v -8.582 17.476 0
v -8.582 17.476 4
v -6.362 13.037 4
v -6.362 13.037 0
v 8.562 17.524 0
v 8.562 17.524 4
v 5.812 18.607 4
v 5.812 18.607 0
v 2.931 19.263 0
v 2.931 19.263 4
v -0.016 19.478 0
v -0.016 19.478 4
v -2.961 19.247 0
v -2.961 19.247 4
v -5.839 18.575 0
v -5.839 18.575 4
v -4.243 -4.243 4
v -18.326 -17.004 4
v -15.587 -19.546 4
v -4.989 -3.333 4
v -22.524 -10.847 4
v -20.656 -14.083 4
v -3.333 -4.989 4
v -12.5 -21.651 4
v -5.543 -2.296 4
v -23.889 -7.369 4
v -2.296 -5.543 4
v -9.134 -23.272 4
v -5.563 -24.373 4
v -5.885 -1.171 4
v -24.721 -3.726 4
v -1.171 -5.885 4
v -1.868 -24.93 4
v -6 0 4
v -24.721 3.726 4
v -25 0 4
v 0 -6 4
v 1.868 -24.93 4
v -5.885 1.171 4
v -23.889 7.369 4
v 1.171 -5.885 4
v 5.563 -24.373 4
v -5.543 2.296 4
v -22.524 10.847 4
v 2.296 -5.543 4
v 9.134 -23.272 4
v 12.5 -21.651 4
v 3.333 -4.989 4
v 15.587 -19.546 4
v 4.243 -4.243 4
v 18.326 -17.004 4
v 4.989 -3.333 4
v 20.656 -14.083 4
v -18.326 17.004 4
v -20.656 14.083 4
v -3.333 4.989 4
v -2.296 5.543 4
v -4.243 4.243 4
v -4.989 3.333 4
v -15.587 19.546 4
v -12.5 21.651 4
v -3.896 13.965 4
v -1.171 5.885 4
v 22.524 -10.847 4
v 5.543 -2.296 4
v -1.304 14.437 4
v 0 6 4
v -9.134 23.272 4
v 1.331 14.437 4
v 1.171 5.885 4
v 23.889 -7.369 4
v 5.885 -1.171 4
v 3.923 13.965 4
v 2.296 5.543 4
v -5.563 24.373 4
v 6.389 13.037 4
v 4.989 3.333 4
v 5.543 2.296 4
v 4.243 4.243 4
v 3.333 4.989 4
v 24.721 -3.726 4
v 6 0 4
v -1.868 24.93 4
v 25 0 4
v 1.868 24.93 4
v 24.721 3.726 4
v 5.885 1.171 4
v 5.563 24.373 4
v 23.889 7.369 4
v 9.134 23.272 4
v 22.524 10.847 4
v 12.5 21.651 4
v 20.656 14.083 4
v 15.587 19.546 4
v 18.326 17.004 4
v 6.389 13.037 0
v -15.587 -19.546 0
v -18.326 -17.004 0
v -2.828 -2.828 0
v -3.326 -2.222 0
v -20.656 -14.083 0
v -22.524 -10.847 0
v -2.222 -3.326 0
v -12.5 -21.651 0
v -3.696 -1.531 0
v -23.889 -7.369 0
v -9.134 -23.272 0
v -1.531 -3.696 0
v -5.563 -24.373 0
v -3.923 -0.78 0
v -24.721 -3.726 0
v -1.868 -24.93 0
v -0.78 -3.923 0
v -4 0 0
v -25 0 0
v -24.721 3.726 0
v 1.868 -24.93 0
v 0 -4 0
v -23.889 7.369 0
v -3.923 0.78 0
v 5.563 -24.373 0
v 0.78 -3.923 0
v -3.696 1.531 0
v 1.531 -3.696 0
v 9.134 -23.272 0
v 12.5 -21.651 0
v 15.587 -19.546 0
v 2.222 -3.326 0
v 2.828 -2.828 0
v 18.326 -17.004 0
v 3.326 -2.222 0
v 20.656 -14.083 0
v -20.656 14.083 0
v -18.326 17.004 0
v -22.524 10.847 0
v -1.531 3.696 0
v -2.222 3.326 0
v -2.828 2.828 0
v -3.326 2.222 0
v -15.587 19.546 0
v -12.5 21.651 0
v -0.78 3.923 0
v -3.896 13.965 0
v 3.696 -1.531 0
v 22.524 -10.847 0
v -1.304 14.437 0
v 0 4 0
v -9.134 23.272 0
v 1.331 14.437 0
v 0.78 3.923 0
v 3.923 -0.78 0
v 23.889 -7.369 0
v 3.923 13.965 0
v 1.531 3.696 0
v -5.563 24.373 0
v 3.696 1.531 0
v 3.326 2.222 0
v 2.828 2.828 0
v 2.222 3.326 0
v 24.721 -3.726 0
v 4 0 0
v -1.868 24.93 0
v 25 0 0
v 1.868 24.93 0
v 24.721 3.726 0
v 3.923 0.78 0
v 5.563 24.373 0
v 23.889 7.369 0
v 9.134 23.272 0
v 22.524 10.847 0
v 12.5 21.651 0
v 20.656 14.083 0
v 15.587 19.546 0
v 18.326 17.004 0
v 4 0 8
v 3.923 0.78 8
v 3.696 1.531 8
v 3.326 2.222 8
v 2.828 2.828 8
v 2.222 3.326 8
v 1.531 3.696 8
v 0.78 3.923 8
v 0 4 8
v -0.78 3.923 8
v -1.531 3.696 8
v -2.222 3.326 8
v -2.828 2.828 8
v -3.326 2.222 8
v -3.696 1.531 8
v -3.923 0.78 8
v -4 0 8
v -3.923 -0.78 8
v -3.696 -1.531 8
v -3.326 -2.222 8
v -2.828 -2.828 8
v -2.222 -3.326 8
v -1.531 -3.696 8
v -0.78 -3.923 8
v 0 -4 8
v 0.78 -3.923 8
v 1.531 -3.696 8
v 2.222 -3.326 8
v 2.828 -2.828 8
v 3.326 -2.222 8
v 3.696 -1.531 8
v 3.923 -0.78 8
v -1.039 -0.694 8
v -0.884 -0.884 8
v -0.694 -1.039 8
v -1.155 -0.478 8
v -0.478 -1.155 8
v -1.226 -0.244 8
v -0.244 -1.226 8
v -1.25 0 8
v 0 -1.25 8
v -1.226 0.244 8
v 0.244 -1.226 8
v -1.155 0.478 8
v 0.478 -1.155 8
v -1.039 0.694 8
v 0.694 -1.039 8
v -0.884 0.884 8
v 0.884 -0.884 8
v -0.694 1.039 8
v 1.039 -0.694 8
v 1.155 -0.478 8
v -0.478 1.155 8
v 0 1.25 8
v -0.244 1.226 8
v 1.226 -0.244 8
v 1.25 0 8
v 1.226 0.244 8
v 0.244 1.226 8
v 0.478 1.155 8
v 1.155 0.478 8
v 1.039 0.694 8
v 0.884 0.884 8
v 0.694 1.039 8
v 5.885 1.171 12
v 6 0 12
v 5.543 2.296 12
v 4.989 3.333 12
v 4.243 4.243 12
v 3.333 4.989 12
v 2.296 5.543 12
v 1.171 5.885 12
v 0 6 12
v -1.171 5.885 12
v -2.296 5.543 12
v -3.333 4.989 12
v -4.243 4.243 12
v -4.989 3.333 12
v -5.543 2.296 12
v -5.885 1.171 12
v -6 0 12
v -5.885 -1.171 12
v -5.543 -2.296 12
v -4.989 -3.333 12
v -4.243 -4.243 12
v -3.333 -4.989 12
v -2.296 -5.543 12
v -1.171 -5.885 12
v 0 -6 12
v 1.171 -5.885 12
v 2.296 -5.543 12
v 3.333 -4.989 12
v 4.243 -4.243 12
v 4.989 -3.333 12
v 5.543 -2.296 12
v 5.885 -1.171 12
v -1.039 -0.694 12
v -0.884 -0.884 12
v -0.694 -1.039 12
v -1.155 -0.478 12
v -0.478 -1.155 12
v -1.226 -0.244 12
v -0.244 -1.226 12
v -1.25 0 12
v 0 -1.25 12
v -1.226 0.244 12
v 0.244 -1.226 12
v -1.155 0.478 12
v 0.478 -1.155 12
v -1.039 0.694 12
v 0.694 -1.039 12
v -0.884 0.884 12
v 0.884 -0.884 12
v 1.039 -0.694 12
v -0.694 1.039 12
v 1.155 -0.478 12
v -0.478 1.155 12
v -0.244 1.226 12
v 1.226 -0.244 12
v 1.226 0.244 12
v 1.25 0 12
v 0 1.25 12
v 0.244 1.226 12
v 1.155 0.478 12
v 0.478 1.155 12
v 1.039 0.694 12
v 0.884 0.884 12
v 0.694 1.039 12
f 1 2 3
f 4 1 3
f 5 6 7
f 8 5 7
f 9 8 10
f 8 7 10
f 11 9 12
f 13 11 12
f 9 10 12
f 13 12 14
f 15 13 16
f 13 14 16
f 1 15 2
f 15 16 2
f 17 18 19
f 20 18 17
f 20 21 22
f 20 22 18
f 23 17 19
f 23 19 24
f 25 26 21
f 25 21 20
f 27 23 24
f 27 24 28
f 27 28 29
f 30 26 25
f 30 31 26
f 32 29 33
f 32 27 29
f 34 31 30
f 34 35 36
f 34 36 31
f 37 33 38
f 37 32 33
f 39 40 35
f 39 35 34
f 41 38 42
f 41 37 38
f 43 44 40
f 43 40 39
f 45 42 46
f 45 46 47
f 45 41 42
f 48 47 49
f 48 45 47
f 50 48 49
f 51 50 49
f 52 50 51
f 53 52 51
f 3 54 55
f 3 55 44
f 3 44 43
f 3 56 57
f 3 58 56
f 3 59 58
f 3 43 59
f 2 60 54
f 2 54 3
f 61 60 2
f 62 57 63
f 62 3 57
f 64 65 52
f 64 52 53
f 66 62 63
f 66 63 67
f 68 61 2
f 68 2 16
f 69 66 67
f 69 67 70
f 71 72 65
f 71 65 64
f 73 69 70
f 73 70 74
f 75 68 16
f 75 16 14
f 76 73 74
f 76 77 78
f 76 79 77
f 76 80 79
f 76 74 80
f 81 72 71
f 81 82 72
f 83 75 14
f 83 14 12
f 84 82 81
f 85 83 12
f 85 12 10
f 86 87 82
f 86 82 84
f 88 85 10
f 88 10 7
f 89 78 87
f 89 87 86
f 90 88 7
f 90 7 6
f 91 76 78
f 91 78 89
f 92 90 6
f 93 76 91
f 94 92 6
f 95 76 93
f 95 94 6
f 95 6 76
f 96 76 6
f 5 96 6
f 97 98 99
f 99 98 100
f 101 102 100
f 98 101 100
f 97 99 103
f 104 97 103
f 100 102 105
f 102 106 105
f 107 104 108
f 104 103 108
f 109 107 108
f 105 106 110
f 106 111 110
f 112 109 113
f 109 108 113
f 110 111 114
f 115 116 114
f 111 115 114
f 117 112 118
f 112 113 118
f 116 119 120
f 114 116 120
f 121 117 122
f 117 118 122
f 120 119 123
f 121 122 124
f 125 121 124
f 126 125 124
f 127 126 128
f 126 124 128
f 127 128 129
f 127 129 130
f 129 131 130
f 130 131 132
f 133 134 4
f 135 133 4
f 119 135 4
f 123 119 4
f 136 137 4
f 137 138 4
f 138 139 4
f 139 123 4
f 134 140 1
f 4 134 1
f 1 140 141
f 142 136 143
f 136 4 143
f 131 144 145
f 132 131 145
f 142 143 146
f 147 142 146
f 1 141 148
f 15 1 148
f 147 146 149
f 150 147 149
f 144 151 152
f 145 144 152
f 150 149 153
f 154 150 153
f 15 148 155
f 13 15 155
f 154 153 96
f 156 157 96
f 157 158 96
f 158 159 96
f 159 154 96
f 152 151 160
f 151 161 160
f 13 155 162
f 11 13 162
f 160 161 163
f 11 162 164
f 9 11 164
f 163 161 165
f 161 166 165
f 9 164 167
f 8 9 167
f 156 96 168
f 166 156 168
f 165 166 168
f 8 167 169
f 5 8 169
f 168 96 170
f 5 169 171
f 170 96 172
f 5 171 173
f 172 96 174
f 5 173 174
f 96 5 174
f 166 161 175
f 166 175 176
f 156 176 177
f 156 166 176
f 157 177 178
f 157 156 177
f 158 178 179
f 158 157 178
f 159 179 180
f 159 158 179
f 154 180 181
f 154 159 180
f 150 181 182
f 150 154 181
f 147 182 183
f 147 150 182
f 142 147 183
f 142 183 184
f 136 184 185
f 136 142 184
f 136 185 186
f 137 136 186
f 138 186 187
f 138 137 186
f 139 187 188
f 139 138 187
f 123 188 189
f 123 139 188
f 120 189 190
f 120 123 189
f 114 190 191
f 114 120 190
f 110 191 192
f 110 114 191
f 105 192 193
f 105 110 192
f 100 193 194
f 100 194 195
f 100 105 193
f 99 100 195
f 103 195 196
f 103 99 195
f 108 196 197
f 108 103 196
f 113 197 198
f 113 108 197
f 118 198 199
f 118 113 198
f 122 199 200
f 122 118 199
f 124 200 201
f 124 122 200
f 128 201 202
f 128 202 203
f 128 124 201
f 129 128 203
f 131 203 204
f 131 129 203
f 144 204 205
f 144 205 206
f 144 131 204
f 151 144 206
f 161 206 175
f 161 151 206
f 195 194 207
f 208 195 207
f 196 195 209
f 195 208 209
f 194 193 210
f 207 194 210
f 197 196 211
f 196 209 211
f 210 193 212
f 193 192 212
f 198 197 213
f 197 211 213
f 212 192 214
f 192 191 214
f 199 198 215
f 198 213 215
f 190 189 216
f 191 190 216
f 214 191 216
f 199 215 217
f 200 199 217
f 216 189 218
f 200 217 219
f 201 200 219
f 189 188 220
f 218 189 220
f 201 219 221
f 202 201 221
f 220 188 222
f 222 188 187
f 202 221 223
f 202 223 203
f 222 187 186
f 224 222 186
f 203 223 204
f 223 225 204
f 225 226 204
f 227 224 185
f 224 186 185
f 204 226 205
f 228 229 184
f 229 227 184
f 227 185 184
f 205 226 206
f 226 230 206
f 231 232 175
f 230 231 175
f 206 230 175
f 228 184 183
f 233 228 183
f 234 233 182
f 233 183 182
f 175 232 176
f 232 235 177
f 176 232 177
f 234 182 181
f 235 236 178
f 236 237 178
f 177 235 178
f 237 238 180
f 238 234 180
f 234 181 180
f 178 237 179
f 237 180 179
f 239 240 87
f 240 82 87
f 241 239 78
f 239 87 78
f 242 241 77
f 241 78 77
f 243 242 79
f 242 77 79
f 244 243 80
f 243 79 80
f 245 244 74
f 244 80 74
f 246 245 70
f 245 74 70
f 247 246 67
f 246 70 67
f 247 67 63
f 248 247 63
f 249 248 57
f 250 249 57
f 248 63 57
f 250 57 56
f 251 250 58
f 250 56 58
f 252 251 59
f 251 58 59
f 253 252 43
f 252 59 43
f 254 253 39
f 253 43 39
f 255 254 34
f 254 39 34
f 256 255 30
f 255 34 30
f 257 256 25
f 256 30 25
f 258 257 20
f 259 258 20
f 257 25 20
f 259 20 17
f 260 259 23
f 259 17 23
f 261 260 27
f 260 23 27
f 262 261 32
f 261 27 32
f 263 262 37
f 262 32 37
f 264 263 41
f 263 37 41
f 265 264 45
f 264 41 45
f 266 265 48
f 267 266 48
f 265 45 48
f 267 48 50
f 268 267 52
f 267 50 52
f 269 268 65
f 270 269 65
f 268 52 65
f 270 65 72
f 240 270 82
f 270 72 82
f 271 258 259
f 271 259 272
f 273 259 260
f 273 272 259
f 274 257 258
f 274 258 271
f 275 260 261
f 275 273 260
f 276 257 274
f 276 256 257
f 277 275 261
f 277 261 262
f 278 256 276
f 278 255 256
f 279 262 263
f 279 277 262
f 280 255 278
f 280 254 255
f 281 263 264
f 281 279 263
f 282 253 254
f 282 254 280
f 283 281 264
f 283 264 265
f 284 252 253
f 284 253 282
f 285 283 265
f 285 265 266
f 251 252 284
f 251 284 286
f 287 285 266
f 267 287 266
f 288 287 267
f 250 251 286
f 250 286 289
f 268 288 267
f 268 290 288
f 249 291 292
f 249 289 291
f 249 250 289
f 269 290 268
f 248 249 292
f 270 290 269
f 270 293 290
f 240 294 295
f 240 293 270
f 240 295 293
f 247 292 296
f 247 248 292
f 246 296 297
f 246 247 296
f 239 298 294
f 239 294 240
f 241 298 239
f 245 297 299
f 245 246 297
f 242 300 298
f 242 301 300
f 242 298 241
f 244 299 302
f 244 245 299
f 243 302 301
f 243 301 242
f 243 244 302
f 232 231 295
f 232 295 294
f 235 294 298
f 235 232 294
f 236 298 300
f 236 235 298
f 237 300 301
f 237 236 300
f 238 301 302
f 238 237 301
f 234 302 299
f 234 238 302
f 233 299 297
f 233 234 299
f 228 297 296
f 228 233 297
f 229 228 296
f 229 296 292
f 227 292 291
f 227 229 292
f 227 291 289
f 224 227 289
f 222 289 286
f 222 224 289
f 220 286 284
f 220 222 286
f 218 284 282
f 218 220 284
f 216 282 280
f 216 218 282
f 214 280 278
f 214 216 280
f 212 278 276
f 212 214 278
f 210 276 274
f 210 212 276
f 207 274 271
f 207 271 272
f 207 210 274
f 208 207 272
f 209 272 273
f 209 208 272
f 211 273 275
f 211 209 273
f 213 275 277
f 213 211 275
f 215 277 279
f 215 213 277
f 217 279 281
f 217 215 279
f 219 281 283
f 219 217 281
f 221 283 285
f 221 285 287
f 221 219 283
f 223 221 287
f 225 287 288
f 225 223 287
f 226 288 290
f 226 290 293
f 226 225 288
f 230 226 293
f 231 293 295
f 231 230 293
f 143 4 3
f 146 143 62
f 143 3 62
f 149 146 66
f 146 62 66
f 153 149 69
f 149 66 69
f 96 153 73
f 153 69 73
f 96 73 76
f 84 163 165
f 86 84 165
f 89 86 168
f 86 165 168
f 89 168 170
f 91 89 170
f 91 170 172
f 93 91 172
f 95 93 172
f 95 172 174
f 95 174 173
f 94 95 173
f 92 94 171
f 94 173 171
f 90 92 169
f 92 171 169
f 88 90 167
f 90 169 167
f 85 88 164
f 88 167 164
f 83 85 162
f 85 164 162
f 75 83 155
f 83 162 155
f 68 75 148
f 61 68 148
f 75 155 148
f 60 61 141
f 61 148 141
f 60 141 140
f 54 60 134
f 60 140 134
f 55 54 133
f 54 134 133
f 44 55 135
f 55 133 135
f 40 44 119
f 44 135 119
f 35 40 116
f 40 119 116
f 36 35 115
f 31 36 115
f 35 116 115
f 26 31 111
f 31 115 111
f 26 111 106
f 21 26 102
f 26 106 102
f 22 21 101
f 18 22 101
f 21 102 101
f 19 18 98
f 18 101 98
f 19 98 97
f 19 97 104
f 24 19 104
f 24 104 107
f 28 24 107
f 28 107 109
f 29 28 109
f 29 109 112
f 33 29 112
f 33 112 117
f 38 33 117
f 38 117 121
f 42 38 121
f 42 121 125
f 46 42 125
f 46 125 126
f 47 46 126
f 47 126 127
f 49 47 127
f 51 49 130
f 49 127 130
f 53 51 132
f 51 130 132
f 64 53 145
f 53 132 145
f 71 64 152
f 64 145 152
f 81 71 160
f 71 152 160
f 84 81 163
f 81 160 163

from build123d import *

# Parameters (mm, degrees)
F0_R     = 25
F0_R_2   = 6
F1_DEPTH = 4
F0_R_3   = 4
F2_DEPTH = 8
F5_DEPTH = 25
F6_R     = 6
F6_R_2   = 1.25
F7_DEPTH = 4


with BuildPart() as f1:
    # F0 (on Top) → F1 (new body)
    with BuildSketch(Plane.XY):
        Circle(F0_R)
        Circle(F0_R_2, mode=Mode.SUBTRACT)
    extrude(amount=F1_DEPTH)

    # F0 (on Top) → F2 (join)
    with BuildSketch(Plane.XY):
        Circle(F0_R_2)
        Circle(F0_R_3, mode=Mode.SUBTRACT)
    extrude(amount=F2_DEPTH)

    # F4 (on face) → F5 (cut)
    with BuildSketch(Plane.XY.offset(4)):
        with BuildLine():
            ThreePointArc((8.561512, 17.523658), (-0.015533, 19.478312), (-8.581679, 17.47643))
            Line((-8.581679, 17.47643), (-6.362037, 13.037147))
            ThreePointArc((-6.362037, 13.037147), (0.01353, 14.496219), (6.389097, 13.037147))
            Line((6.389097, 13.037147), (8.561512, 17.523658))
        make_face()
    extrude(amount=-F5_DEPTH, mode=Mode.SUBTRACT)

    # F6 (on face) → F7 (join)
    with BuildSketch(Plane.XY.offset(8)):
        Circle(F6_R)
        Circle(F6_R_2, mode=Mode.SUBTRACT)
    extrude(amount=F7_DEPTH)


solid = f1.part
